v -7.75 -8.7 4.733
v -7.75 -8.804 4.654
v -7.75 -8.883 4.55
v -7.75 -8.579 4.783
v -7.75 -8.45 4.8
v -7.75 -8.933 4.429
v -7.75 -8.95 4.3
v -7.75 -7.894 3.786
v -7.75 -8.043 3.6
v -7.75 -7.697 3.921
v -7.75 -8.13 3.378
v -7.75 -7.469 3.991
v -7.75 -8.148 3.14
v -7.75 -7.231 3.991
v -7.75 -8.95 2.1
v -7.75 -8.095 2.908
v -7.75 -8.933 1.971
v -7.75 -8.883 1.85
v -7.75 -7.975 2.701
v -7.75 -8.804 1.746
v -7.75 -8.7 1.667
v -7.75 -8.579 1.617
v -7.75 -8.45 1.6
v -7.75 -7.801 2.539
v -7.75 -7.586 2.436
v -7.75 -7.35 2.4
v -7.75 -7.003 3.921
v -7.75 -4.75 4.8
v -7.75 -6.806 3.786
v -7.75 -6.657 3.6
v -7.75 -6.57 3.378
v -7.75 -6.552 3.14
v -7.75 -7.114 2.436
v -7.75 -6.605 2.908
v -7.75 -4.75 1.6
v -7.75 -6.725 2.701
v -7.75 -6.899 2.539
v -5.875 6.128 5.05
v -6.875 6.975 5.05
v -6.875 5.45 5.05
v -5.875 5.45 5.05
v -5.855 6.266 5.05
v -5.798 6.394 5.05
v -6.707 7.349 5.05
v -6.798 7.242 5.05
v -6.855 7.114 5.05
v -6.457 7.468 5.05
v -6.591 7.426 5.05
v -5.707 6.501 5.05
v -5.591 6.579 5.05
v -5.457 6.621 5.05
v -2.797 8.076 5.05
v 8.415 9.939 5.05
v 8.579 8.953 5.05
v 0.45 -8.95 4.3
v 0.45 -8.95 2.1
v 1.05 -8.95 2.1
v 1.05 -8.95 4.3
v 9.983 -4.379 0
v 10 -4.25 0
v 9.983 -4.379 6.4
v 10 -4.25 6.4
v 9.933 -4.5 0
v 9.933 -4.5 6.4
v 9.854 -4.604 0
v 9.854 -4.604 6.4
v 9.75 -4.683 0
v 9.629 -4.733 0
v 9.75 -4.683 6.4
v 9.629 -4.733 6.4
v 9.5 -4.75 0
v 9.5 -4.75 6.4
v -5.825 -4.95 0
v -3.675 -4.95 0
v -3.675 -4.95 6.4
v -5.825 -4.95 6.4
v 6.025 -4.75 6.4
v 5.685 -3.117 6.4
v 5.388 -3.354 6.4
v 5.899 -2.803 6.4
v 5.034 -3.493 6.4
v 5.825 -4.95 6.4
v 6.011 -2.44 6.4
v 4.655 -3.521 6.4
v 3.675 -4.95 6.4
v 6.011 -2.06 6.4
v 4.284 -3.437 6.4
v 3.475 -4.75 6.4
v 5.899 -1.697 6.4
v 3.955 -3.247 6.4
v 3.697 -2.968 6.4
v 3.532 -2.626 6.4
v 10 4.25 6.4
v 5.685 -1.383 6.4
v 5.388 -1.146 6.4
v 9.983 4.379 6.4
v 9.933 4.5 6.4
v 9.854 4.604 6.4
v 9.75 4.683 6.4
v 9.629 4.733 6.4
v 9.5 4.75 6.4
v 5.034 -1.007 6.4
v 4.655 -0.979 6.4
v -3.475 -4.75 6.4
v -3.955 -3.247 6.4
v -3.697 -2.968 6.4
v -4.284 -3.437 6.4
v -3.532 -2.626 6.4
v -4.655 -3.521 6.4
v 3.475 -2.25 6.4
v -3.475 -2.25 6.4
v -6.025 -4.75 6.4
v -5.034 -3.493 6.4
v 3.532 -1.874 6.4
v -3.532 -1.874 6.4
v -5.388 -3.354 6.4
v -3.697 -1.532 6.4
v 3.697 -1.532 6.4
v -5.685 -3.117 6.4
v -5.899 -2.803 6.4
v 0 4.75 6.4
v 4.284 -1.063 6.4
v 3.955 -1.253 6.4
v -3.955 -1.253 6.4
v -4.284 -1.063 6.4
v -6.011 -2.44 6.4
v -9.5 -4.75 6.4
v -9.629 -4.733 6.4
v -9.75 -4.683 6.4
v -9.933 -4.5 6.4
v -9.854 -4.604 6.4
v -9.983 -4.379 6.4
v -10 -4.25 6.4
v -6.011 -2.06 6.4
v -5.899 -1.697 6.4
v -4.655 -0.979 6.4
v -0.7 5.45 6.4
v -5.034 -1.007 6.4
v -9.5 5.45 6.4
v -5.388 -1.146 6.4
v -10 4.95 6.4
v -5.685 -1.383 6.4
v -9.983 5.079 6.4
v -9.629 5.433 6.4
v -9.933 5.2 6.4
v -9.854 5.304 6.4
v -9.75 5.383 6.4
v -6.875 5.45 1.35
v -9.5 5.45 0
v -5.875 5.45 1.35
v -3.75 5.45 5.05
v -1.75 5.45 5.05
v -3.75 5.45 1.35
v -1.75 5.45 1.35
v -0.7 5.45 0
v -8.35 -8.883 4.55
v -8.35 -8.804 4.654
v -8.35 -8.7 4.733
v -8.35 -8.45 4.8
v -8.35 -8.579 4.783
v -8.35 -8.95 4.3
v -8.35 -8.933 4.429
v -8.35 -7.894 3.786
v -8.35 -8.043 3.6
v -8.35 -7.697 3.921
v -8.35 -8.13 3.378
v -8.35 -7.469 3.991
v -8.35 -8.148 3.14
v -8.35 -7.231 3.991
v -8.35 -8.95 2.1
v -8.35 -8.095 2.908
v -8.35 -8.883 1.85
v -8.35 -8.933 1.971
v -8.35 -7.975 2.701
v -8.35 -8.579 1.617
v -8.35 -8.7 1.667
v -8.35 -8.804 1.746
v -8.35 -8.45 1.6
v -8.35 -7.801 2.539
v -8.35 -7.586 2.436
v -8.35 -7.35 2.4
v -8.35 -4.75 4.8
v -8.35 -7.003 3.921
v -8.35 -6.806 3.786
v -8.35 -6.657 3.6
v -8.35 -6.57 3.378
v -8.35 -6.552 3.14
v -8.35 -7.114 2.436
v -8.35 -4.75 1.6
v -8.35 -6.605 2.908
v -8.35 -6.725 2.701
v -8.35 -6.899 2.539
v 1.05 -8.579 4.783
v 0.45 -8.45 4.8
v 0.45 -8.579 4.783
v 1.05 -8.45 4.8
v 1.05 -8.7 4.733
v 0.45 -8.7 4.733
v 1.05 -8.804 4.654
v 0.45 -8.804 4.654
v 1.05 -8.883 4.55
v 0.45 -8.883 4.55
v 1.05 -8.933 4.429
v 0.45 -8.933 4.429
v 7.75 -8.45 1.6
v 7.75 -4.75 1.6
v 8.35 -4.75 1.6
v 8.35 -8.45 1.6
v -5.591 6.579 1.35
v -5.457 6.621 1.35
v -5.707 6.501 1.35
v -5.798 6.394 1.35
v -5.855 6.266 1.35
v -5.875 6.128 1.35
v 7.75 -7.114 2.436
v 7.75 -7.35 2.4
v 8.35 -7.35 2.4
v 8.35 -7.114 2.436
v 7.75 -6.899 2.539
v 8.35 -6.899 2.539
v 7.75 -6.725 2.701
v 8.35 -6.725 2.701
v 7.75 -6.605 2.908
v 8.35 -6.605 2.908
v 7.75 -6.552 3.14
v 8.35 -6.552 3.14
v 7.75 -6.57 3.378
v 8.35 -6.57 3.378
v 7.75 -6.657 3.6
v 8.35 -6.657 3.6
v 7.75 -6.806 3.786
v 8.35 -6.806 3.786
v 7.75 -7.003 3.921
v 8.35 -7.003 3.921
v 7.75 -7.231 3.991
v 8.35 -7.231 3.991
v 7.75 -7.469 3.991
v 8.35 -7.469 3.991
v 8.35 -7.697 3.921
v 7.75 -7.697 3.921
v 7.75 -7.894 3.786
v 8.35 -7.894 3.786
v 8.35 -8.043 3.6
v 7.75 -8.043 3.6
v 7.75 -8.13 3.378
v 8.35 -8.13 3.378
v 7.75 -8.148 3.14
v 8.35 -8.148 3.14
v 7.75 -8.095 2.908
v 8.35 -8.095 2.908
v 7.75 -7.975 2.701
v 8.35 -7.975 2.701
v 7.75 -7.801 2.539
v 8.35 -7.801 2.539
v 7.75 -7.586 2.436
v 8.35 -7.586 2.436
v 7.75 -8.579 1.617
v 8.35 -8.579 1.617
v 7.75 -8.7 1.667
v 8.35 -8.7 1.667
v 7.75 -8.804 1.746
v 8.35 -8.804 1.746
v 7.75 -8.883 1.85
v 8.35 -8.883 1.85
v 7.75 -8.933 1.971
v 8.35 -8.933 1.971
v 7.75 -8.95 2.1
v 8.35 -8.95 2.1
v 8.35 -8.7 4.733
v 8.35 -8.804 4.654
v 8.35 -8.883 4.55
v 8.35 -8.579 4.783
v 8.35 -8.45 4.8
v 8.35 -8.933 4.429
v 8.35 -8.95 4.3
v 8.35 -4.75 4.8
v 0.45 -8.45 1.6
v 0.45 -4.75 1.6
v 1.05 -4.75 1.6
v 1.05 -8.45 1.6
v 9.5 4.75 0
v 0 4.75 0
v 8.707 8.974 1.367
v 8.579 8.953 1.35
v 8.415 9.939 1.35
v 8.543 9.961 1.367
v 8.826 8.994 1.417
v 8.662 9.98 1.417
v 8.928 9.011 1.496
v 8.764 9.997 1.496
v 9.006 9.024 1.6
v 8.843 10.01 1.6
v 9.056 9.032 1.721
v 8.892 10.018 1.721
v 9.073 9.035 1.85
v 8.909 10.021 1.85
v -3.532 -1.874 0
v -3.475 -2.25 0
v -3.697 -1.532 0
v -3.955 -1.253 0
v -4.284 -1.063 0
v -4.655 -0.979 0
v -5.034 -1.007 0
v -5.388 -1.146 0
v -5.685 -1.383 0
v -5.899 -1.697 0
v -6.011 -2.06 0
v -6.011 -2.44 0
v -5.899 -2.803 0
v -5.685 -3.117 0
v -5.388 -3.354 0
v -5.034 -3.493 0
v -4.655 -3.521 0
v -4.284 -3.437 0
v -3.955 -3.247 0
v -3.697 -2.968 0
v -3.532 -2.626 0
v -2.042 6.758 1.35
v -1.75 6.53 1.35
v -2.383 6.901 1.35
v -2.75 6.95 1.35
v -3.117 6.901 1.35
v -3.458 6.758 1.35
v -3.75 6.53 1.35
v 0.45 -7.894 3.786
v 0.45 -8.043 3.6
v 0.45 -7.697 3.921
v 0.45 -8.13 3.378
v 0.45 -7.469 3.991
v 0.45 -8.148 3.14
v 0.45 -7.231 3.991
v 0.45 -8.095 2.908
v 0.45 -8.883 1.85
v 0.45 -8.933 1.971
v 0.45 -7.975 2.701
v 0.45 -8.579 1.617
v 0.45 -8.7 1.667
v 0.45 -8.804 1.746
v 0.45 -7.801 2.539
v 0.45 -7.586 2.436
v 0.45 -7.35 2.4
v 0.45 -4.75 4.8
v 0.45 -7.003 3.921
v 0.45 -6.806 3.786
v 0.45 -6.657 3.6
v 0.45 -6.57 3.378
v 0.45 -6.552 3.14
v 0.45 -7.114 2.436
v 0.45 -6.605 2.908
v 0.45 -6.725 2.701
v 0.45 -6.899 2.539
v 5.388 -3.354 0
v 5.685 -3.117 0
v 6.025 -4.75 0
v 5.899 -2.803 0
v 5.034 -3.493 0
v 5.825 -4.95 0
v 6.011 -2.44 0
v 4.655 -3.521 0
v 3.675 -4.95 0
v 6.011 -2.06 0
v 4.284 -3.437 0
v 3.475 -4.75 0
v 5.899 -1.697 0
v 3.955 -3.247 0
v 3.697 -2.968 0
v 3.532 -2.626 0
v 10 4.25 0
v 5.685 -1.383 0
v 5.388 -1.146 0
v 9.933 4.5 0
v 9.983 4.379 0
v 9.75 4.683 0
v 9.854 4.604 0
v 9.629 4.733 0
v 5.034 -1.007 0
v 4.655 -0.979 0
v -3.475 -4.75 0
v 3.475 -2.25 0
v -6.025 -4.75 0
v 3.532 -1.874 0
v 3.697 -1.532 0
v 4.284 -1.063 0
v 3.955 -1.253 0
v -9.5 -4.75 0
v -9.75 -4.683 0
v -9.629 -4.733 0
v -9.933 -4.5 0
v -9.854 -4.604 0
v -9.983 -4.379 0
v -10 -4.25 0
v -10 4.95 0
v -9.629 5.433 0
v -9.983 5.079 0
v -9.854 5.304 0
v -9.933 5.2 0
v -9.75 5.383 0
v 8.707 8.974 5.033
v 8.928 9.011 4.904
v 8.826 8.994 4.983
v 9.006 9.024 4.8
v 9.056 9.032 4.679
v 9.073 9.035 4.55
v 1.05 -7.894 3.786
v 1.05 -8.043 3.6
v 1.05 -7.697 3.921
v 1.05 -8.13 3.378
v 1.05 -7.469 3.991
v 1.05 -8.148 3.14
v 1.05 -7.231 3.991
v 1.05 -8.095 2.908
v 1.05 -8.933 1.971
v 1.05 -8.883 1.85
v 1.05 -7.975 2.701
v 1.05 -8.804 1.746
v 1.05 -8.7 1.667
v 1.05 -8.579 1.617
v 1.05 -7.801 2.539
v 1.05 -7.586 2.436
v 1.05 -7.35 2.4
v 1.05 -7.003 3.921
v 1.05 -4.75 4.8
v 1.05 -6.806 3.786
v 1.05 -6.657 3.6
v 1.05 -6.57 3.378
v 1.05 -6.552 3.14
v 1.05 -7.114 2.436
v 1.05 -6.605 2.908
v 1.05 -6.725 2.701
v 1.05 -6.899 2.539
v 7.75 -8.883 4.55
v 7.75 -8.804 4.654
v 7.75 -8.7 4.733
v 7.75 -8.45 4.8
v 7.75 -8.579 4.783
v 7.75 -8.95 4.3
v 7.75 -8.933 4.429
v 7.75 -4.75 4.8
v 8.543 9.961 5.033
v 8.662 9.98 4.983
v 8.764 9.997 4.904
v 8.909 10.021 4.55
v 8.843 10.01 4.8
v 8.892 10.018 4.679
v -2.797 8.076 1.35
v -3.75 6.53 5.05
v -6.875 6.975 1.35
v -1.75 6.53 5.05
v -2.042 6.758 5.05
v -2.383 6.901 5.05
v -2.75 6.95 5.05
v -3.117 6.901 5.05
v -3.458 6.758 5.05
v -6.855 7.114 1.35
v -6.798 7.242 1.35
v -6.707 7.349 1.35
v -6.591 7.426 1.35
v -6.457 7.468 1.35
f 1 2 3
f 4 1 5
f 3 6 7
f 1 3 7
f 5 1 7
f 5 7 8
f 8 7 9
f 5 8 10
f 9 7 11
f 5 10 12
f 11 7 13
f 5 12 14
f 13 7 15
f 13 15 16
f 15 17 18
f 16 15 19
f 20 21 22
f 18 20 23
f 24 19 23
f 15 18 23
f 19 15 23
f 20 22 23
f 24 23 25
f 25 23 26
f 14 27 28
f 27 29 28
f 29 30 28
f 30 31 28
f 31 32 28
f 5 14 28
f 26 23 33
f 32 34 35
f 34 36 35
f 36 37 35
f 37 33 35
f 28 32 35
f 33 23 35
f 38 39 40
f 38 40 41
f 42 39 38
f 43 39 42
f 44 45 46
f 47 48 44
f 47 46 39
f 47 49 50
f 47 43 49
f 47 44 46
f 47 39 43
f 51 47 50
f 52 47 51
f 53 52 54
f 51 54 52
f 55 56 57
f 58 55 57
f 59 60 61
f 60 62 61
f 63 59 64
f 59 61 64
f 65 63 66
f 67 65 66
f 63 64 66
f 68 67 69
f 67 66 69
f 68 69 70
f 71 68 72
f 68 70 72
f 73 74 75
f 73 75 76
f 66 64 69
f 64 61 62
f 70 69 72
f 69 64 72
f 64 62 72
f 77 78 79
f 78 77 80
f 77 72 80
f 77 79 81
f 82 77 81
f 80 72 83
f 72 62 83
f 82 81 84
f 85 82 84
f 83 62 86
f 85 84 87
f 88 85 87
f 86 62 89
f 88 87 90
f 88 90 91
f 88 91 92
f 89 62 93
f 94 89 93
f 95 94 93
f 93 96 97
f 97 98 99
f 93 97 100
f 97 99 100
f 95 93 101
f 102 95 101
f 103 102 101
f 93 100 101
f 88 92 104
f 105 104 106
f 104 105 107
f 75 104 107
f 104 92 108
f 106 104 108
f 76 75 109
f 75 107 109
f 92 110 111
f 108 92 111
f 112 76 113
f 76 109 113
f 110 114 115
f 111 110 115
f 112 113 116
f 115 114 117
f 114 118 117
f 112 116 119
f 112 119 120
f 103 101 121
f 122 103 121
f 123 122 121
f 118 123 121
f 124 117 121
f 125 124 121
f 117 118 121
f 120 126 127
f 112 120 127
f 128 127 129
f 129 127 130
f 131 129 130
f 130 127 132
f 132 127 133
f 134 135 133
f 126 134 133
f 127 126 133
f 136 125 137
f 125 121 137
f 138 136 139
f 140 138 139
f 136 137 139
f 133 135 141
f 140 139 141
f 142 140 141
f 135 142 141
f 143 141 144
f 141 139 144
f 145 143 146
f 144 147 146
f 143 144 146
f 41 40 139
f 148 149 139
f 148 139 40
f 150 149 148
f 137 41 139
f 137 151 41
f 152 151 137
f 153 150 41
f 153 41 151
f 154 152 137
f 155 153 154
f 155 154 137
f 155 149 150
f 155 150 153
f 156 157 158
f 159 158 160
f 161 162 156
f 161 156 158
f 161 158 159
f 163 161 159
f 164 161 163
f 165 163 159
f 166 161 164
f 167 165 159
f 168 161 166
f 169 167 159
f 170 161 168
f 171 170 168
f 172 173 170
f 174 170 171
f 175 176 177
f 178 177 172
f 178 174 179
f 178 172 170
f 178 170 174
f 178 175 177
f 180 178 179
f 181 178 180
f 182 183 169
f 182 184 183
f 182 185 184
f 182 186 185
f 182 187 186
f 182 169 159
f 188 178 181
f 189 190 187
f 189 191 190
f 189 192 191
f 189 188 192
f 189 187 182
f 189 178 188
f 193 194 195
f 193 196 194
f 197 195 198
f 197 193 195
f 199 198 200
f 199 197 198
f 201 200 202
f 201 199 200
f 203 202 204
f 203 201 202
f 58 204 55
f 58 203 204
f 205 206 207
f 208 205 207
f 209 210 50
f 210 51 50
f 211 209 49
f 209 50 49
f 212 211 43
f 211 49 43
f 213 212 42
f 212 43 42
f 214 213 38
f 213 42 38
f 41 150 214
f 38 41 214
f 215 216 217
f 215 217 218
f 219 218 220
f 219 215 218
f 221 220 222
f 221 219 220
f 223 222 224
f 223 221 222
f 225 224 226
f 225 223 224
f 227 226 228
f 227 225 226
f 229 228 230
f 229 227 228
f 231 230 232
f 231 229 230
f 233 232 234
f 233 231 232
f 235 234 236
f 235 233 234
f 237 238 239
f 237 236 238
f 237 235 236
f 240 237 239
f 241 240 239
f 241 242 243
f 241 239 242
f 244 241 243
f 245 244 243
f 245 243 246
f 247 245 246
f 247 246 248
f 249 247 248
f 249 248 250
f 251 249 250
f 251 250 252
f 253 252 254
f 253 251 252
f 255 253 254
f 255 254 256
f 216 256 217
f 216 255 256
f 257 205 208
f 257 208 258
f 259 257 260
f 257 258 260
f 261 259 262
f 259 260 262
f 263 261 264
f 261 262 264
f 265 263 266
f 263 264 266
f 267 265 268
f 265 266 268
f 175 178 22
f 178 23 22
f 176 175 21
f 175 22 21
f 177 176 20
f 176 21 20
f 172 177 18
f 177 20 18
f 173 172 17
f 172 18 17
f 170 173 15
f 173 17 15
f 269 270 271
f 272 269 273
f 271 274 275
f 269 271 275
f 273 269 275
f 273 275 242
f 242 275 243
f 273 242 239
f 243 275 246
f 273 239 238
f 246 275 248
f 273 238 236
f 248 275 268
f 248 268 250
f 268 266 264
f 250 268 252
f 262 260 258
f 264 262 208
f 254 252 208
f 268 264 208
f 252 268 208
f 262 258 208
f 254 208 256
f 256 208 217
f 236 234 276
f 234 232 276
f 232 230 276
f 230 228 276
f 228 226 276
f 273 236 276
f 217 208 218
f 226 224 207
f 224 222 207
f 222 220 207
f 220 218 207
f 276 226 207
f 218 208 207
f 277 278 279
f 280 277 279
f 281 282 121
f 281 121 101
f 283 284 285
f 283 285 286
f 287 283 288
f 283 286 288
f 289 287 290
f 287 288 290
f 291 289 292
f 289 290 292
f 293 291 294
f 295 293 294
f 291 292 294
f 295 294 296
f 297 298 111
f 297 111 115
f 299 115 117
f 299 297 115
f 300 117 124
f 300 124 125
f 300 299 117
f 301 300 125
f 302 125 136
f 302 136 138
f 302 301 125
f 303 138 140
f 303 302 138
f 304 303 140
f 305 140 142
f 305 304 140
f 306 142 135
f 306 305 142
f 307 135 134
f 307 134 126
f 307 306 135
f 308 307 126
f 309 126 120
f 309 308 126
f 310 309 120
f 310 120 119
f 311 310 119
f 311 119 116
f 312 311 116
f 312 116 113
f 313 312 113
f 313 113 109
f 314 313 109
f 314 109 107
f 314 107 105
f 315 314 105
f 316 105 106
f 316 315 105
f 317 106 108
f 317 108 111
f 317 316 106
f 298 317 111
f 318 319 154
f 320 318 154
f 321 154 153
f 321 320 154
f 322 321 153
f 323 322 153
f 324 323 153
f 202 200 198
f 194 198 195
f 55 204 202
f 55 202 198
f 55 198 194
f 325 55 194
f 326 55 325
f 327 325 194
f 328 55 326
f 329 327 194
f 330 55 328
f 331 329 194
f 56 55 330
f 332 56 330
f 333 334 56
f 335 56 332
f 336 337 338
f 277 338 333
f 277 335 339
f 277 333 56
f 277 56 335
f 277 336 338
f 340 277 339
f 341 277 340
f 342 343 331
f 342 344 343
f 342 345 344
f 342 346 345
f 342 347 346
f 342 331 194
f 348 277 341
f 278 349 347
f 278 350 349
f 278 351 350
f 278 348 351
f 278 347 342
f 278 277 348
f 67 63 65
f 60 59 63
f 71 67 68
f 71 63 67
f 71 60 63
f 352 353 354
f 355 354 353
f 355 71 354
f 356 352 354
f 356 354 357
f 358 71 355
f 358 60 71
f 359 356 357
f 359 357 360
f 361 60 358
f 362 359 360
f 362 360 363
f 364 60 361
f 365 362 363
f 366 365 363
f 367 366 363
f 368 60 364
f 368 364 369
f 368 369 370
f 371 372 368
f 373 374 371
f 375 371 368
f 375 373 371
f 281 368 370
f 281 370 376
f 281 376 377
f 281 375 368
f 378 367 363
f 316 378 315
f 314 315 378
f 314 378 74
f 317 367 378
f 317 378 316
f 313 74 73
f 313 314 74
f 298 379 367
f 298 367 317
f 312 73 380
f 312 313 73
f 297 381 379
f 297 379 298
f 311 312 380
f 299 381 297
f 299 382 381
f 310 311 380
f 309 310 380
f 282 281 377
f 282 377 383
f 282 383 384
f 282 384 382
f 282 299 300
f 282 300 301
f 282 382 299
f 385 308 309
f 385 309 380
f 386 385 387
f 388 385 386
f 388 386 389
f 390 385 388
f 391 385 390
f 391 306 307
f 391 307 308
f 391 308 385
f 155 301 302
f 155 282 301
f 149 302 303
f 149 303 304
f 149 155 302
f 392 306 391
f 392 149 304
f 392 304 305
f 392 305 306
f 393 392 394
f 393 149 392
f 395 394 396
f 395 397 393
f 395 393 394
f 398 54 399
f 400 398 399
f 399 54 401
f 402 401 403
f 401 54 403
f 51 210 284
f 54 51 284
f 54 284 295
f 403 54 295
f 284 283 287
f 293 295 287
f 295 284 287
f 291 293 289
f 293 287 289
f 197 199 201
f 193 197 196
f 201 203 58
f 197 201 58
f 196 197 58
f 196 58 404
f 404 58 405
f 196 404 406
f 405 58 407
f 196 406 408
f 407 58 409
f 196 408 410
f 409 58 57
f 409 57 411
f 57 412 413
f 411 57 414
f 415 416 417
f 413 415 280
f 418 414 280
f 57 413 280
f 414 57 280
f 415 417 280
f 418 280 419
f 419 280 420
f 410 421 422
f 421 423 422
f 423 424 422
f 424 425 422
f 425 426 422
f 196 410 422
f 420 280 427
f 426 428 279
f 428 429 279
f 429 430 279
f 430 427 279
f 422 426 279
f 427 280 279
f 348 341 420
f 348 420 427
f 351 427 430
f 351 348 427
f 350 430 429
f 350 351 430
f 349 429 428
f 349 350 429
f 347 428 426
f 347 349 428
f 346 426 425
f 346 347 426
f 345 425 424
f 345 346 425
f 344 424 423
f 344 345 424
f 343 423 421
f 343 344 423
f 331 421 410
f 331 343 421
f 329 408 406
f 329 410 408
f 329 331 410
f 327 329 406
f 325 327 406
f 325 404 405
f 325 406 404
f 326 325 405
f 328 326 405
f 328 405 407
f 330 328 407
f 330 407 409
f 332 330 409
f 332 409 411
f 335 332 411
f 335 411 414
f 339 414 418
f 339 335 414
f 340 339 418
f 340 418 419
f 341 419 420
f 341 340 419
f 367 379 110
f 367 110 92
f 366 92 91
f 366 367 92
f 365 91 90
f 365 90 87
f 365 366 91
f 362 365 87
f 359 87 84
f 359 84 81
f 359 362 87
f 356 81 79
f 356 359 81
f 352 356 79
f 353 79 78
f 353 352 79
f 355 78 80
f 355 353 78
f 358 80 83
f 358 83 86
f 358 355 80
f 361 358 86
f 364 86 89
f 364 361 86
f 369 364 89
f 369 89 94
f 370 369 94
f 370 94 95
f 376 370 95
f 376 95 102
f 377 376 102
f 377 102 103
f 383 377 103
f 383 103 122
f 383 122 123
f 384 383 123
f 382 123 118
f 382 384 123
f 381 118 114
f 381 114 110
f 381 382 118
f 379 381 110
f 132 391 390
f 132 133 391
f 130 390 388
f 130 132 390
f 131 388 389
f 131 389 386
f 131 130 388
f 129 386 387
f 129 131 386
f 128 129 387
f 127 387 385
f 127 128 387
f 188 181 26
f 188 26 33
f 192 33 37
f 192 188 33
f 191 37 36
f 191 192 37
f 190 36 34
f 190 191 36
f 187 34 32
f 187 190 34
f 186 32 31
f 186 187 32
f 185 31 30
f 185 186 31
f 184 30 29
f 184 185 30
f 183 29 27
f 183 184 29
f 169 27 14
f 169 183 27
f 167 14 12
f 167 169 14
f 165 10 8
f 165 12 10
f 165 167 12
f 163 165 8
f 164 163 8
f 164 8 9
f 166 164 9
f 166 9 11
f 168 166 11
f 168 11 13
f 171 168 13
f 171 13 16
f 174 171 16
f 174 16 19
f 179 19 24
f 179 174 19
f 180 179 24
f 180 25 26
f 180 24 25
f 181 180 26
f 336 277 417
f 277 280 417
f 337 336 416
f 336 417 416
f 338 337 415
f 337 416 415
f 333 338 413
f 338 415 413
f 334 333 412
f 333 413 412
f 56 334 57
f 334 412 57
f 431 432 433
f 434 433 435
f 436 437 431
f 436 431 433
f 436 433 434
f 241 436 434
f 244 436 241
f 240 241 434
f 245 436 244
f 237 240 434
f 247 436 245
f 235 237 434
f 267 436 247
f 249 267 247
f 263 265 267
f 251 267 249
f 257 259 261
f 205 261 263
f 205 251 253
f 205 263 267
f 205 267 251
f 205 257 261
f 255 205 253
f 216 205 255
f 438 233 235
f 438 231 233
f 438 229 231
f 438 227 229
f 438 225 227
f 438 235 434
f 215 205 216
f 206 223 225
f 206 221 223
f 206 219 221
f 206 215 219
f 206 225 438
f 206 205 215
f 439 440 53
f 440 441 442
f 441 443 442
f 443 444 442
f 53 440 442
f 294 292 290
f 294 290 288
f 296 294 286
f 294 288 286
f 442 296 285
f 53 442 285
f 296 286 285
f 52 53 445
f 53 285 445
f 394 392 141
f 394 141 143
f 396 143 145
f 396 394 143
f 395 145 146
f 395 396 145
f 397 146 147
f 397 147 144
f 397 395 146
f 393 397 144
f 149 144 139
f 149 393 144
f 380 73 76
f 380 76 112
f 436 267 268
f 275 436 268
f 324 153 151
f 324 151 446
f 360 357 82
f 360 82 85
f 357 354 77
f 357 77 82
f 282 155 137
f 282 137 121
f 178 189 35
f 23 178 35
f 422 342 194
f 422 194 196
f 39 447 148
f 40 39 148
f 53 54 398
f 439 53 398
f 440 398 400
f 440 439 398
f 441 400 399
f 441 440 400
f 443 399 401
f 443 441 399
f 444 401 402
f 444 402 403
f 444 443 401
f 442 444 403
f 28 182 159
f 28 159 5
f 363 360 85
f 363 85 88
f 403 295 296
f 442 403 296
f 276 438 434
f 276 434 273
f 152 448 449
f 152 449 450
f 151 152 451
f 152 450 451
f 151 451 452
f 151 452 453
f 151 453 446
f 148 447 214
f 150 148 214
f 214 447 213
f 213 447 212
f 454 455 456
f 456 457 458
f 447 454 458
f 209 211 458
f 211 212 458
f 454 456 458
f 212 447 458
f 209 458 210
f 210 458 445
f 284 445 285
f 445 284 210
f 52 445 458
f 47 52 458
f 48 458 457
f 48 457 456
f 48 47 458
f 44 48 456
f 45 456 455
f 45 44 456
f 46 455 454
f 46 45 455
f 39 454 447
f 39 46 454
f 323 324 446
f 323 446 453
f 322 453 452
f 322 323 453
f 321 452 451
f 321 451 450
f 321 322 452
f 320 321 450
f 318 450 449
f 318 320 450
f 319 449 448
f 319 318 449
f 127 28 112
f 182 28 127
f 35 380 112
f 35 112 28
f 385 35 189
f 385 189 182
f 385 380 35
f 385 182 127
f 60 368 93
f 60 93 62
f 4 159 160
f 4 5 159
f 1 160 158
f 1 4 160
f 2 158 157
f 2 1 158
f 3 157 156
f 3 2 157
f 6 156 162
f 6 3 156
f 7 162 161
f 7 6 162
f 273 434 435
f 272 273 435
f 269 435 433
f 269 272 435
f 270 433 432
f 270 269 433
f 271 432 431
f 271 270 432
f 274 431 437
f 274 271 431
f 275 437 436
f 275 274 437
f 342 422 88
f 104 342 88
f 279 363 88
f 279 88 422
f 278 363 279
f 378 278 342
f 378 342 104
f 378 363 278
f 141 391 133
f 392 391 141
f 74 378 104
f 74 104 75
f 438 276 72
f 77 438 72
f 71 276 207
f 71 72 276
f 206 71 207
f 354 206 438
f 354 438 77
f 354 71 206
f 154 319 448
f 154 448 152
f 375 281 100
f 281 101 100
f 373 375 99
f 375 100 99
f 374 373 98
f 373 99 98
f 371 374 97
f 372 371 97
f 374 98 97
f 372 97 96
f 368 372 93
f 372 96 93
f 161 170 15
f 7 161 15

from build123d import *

# Parameters (mm, degrees)
SKETCH_1_R               = 1.275
EXTRUDE_1_DEPTH          = 6.4
FILLET_1_R               = 0.5
EXTRUDE_2_DEPTH          = 1.6
EXTRUDE_2_DEPTH_BACK     = 1.6
SKETCH_2_W               = 0.6
SKETCH_2_H               = 4.2
EXTRUDE_3_DEPTH          = 1.85
EXTRUDE_3_DEPTH_BACK     = 1.85
EXTRUDE_7_DEPTH          = 1.85
EXTRUDE_7_DEPTH_BACK     = 1.85
FILLET_2_R               = 0.5
FILLET_3_R               = 0.5
CUT_EXTRUDE_1_DEPTH      = 16.536582441
CUT_EXTRUDE_1_DEPTH_BACK = 16.536582441
SKETCH_5_R               = 0.8


with BuildPart() as part:
    # 草图1 → 凸台-拉伸1 (new body)
    with BuildSketch(Plane.XY):
        with BuildLine():
            Line((-10, -4.75), (-10, 4.75))
            Line((-10, 4.75), (-10, 4.95))
            ThreePointArc((-10, 4.95), (-9.853553391, 5.303553391), (-9.5, 5.45))
            Line((-9.5, 5.45), (-0.7, 5.45))
            Line((-0.7, 5.45), (0, 4.75))
            Line((0, 4.75), (10, 4.75))
            Line((10, 4.75), (10, -4.75))
            Line((10, -4.75), (6.025, -4.75))
            Line((6.025, -4.75), (5.825, -4.95))
            Line((5.825, -4.95), (3.675, -4.95))
            Line((3.675, -4.95), (3.475, -4.75))
            Line((3.475, -4.75), (-3.475, -4.75))
            Line((-3.475, -4.75), (-3.675, -4.95))
            Line((-3.675, -4.95), (-5.825, -4.95))
            Line((-5.825, -4.95), (-6.025, -4.75))
            Line((-6.025, -4.75), (-10, -4.75))
        make_face()
        with Locations((-4.75, -2.25)):
            Circle(SKETCH_1_R, mode=Mode.SUBTRACT)
        with Locations(Location((4.75, -2.25, 0), (0, 0, 180))):
            Circle(SKETCH_1_R, mode=Mode.SUBTRACT)
    extrude(amount=EXTRUDE_1_DEPTH)

    # 圆角1
    fillet_1_edges = [part.edges().sort_by_distance(p)[0] for p in [
        (10, 4.75, 3.2),
        (10, -4.75, 3.2),
        (-10, -4.75, 3.2),
    ]]
    fillet(fillet_1_edges, radius=FILLET_1_R)

    # 草图2 → 凸台-拉伸2 (add, two sides: drawn at the far end of the back side and taken through both)
    with BuildSketch(Plane.XY.offset(3.2).offset(-EXTRUDE_2_DEPTH_BACK)):
        with Locations((-8.05, -6.85)):
            Rectangle(SKETCH_2_W, SKETCH_2_H)
        with Locations((0.75, -6.85)):
            Rectangle(SKETCH_2_W, SKETCH_2_H)
        with Locations((8.05, -6.85)):
            Rectangle(SKETCH_2_W, SKETCH_2_H)
    extrude(amount=EXTRUDE_2_DEPTH + EXTRUDE_2_DEPTH_BACK)

    # 草图3 → 凸台-拉伸3 (add, two sides: drawn at the far end of the back side and taken through both)
    with BuildSketch(Plane.XY.offset(3.2).offset(-EXTRUDE_3_DEPTH_BACK)):
        with BuildLine():
            ThreePointArc((-3.75, 6.529795897), (-2.75, 6.95), (-1.75, 6.529795897))
            Line((-1.75, 6.529795897), (-1.75, 5.45))
            Line((-1.75, 5.45), (-3.75, 5.45))
            Line((-3.75, 5.45), (-3.75, 6.529795897))
        make_face()
    extrude(amount=EXTRUDE_3_DEPTH + EXTRUDE_3_DEPTH_BACK)

    # 草图4 → 凸台-拉伸7 (add, two sides: drawn at the far end of the back side and taken through both)
    with BuildSketch(Plane.XY.offset(3.2).offset(-EXTRUDE_7_DEPTH_BACK)):
        Polygon((-2.796894142, 8.076477611), (-6.875, 7.398937263), (-6.875, 5.45), (-6.875, 4.395314544), (-5.875, 4.395314544), (-5.875, 5.45), (-5.875, 6.45), (-5.875, 6.551370746), (9.072540681, 9.03476923), (8.908646315, 10.021247125), align=None)
    extrude(amount=EXTRUDE_7_DEPTH + EXTRUDE_7_DEPTH_BACK)

    # 圆角2
    fillet_2_edges = [part.edges().sort_by_distance(p)[0] for p in [
        (-5.875, 6.551370746, 3.2),
        (8.990593498, 9.528008177, 5.05),
        (-6.875, 7.398937263, 3.2),
        (8.990593498, 9.528008177, 1.35),
    ]]
    fillet(fillet_2_edges, radius=FILLET_2_R)

    # 圆角3
    fillet_3_edges = [part.edges().sort_by_distance(p)[0] for p in [
        (-8.05, -8.95, 1.6),
        (-8.05, -8.95, 4.8),
        (0.75, -8.95, 1.6),
        (0.75, -8.95, 4.8),
        (8.05, -8.95, 1.6),
        (8.05, -8.95, 4.8),
    ]]
    fillet(fillet_3_edges, radius=FILLET_3_R)

    # 草图5 → 切除-拉伸1 (cut, two sides: drawn at the far end of the back side and taken through both)
    with BuildSketch(Plane(origin=(0, 0, 0), x_dir=(0, 0, -1), z_dir=(1, 0, 0)).offset(-CUT_EXTRUDE_1_DEPTH_BACK)):
        with Locations((-3.2, -7.35)):
            Circle(SKETCH_5_R)
    extrude(amount=CUT_EXTRUDE_1_DEPTH + CUT_EXTRUDE_1_DEPTH_BACK, mode=Mode.SUBTRACT)


solid = part.part
